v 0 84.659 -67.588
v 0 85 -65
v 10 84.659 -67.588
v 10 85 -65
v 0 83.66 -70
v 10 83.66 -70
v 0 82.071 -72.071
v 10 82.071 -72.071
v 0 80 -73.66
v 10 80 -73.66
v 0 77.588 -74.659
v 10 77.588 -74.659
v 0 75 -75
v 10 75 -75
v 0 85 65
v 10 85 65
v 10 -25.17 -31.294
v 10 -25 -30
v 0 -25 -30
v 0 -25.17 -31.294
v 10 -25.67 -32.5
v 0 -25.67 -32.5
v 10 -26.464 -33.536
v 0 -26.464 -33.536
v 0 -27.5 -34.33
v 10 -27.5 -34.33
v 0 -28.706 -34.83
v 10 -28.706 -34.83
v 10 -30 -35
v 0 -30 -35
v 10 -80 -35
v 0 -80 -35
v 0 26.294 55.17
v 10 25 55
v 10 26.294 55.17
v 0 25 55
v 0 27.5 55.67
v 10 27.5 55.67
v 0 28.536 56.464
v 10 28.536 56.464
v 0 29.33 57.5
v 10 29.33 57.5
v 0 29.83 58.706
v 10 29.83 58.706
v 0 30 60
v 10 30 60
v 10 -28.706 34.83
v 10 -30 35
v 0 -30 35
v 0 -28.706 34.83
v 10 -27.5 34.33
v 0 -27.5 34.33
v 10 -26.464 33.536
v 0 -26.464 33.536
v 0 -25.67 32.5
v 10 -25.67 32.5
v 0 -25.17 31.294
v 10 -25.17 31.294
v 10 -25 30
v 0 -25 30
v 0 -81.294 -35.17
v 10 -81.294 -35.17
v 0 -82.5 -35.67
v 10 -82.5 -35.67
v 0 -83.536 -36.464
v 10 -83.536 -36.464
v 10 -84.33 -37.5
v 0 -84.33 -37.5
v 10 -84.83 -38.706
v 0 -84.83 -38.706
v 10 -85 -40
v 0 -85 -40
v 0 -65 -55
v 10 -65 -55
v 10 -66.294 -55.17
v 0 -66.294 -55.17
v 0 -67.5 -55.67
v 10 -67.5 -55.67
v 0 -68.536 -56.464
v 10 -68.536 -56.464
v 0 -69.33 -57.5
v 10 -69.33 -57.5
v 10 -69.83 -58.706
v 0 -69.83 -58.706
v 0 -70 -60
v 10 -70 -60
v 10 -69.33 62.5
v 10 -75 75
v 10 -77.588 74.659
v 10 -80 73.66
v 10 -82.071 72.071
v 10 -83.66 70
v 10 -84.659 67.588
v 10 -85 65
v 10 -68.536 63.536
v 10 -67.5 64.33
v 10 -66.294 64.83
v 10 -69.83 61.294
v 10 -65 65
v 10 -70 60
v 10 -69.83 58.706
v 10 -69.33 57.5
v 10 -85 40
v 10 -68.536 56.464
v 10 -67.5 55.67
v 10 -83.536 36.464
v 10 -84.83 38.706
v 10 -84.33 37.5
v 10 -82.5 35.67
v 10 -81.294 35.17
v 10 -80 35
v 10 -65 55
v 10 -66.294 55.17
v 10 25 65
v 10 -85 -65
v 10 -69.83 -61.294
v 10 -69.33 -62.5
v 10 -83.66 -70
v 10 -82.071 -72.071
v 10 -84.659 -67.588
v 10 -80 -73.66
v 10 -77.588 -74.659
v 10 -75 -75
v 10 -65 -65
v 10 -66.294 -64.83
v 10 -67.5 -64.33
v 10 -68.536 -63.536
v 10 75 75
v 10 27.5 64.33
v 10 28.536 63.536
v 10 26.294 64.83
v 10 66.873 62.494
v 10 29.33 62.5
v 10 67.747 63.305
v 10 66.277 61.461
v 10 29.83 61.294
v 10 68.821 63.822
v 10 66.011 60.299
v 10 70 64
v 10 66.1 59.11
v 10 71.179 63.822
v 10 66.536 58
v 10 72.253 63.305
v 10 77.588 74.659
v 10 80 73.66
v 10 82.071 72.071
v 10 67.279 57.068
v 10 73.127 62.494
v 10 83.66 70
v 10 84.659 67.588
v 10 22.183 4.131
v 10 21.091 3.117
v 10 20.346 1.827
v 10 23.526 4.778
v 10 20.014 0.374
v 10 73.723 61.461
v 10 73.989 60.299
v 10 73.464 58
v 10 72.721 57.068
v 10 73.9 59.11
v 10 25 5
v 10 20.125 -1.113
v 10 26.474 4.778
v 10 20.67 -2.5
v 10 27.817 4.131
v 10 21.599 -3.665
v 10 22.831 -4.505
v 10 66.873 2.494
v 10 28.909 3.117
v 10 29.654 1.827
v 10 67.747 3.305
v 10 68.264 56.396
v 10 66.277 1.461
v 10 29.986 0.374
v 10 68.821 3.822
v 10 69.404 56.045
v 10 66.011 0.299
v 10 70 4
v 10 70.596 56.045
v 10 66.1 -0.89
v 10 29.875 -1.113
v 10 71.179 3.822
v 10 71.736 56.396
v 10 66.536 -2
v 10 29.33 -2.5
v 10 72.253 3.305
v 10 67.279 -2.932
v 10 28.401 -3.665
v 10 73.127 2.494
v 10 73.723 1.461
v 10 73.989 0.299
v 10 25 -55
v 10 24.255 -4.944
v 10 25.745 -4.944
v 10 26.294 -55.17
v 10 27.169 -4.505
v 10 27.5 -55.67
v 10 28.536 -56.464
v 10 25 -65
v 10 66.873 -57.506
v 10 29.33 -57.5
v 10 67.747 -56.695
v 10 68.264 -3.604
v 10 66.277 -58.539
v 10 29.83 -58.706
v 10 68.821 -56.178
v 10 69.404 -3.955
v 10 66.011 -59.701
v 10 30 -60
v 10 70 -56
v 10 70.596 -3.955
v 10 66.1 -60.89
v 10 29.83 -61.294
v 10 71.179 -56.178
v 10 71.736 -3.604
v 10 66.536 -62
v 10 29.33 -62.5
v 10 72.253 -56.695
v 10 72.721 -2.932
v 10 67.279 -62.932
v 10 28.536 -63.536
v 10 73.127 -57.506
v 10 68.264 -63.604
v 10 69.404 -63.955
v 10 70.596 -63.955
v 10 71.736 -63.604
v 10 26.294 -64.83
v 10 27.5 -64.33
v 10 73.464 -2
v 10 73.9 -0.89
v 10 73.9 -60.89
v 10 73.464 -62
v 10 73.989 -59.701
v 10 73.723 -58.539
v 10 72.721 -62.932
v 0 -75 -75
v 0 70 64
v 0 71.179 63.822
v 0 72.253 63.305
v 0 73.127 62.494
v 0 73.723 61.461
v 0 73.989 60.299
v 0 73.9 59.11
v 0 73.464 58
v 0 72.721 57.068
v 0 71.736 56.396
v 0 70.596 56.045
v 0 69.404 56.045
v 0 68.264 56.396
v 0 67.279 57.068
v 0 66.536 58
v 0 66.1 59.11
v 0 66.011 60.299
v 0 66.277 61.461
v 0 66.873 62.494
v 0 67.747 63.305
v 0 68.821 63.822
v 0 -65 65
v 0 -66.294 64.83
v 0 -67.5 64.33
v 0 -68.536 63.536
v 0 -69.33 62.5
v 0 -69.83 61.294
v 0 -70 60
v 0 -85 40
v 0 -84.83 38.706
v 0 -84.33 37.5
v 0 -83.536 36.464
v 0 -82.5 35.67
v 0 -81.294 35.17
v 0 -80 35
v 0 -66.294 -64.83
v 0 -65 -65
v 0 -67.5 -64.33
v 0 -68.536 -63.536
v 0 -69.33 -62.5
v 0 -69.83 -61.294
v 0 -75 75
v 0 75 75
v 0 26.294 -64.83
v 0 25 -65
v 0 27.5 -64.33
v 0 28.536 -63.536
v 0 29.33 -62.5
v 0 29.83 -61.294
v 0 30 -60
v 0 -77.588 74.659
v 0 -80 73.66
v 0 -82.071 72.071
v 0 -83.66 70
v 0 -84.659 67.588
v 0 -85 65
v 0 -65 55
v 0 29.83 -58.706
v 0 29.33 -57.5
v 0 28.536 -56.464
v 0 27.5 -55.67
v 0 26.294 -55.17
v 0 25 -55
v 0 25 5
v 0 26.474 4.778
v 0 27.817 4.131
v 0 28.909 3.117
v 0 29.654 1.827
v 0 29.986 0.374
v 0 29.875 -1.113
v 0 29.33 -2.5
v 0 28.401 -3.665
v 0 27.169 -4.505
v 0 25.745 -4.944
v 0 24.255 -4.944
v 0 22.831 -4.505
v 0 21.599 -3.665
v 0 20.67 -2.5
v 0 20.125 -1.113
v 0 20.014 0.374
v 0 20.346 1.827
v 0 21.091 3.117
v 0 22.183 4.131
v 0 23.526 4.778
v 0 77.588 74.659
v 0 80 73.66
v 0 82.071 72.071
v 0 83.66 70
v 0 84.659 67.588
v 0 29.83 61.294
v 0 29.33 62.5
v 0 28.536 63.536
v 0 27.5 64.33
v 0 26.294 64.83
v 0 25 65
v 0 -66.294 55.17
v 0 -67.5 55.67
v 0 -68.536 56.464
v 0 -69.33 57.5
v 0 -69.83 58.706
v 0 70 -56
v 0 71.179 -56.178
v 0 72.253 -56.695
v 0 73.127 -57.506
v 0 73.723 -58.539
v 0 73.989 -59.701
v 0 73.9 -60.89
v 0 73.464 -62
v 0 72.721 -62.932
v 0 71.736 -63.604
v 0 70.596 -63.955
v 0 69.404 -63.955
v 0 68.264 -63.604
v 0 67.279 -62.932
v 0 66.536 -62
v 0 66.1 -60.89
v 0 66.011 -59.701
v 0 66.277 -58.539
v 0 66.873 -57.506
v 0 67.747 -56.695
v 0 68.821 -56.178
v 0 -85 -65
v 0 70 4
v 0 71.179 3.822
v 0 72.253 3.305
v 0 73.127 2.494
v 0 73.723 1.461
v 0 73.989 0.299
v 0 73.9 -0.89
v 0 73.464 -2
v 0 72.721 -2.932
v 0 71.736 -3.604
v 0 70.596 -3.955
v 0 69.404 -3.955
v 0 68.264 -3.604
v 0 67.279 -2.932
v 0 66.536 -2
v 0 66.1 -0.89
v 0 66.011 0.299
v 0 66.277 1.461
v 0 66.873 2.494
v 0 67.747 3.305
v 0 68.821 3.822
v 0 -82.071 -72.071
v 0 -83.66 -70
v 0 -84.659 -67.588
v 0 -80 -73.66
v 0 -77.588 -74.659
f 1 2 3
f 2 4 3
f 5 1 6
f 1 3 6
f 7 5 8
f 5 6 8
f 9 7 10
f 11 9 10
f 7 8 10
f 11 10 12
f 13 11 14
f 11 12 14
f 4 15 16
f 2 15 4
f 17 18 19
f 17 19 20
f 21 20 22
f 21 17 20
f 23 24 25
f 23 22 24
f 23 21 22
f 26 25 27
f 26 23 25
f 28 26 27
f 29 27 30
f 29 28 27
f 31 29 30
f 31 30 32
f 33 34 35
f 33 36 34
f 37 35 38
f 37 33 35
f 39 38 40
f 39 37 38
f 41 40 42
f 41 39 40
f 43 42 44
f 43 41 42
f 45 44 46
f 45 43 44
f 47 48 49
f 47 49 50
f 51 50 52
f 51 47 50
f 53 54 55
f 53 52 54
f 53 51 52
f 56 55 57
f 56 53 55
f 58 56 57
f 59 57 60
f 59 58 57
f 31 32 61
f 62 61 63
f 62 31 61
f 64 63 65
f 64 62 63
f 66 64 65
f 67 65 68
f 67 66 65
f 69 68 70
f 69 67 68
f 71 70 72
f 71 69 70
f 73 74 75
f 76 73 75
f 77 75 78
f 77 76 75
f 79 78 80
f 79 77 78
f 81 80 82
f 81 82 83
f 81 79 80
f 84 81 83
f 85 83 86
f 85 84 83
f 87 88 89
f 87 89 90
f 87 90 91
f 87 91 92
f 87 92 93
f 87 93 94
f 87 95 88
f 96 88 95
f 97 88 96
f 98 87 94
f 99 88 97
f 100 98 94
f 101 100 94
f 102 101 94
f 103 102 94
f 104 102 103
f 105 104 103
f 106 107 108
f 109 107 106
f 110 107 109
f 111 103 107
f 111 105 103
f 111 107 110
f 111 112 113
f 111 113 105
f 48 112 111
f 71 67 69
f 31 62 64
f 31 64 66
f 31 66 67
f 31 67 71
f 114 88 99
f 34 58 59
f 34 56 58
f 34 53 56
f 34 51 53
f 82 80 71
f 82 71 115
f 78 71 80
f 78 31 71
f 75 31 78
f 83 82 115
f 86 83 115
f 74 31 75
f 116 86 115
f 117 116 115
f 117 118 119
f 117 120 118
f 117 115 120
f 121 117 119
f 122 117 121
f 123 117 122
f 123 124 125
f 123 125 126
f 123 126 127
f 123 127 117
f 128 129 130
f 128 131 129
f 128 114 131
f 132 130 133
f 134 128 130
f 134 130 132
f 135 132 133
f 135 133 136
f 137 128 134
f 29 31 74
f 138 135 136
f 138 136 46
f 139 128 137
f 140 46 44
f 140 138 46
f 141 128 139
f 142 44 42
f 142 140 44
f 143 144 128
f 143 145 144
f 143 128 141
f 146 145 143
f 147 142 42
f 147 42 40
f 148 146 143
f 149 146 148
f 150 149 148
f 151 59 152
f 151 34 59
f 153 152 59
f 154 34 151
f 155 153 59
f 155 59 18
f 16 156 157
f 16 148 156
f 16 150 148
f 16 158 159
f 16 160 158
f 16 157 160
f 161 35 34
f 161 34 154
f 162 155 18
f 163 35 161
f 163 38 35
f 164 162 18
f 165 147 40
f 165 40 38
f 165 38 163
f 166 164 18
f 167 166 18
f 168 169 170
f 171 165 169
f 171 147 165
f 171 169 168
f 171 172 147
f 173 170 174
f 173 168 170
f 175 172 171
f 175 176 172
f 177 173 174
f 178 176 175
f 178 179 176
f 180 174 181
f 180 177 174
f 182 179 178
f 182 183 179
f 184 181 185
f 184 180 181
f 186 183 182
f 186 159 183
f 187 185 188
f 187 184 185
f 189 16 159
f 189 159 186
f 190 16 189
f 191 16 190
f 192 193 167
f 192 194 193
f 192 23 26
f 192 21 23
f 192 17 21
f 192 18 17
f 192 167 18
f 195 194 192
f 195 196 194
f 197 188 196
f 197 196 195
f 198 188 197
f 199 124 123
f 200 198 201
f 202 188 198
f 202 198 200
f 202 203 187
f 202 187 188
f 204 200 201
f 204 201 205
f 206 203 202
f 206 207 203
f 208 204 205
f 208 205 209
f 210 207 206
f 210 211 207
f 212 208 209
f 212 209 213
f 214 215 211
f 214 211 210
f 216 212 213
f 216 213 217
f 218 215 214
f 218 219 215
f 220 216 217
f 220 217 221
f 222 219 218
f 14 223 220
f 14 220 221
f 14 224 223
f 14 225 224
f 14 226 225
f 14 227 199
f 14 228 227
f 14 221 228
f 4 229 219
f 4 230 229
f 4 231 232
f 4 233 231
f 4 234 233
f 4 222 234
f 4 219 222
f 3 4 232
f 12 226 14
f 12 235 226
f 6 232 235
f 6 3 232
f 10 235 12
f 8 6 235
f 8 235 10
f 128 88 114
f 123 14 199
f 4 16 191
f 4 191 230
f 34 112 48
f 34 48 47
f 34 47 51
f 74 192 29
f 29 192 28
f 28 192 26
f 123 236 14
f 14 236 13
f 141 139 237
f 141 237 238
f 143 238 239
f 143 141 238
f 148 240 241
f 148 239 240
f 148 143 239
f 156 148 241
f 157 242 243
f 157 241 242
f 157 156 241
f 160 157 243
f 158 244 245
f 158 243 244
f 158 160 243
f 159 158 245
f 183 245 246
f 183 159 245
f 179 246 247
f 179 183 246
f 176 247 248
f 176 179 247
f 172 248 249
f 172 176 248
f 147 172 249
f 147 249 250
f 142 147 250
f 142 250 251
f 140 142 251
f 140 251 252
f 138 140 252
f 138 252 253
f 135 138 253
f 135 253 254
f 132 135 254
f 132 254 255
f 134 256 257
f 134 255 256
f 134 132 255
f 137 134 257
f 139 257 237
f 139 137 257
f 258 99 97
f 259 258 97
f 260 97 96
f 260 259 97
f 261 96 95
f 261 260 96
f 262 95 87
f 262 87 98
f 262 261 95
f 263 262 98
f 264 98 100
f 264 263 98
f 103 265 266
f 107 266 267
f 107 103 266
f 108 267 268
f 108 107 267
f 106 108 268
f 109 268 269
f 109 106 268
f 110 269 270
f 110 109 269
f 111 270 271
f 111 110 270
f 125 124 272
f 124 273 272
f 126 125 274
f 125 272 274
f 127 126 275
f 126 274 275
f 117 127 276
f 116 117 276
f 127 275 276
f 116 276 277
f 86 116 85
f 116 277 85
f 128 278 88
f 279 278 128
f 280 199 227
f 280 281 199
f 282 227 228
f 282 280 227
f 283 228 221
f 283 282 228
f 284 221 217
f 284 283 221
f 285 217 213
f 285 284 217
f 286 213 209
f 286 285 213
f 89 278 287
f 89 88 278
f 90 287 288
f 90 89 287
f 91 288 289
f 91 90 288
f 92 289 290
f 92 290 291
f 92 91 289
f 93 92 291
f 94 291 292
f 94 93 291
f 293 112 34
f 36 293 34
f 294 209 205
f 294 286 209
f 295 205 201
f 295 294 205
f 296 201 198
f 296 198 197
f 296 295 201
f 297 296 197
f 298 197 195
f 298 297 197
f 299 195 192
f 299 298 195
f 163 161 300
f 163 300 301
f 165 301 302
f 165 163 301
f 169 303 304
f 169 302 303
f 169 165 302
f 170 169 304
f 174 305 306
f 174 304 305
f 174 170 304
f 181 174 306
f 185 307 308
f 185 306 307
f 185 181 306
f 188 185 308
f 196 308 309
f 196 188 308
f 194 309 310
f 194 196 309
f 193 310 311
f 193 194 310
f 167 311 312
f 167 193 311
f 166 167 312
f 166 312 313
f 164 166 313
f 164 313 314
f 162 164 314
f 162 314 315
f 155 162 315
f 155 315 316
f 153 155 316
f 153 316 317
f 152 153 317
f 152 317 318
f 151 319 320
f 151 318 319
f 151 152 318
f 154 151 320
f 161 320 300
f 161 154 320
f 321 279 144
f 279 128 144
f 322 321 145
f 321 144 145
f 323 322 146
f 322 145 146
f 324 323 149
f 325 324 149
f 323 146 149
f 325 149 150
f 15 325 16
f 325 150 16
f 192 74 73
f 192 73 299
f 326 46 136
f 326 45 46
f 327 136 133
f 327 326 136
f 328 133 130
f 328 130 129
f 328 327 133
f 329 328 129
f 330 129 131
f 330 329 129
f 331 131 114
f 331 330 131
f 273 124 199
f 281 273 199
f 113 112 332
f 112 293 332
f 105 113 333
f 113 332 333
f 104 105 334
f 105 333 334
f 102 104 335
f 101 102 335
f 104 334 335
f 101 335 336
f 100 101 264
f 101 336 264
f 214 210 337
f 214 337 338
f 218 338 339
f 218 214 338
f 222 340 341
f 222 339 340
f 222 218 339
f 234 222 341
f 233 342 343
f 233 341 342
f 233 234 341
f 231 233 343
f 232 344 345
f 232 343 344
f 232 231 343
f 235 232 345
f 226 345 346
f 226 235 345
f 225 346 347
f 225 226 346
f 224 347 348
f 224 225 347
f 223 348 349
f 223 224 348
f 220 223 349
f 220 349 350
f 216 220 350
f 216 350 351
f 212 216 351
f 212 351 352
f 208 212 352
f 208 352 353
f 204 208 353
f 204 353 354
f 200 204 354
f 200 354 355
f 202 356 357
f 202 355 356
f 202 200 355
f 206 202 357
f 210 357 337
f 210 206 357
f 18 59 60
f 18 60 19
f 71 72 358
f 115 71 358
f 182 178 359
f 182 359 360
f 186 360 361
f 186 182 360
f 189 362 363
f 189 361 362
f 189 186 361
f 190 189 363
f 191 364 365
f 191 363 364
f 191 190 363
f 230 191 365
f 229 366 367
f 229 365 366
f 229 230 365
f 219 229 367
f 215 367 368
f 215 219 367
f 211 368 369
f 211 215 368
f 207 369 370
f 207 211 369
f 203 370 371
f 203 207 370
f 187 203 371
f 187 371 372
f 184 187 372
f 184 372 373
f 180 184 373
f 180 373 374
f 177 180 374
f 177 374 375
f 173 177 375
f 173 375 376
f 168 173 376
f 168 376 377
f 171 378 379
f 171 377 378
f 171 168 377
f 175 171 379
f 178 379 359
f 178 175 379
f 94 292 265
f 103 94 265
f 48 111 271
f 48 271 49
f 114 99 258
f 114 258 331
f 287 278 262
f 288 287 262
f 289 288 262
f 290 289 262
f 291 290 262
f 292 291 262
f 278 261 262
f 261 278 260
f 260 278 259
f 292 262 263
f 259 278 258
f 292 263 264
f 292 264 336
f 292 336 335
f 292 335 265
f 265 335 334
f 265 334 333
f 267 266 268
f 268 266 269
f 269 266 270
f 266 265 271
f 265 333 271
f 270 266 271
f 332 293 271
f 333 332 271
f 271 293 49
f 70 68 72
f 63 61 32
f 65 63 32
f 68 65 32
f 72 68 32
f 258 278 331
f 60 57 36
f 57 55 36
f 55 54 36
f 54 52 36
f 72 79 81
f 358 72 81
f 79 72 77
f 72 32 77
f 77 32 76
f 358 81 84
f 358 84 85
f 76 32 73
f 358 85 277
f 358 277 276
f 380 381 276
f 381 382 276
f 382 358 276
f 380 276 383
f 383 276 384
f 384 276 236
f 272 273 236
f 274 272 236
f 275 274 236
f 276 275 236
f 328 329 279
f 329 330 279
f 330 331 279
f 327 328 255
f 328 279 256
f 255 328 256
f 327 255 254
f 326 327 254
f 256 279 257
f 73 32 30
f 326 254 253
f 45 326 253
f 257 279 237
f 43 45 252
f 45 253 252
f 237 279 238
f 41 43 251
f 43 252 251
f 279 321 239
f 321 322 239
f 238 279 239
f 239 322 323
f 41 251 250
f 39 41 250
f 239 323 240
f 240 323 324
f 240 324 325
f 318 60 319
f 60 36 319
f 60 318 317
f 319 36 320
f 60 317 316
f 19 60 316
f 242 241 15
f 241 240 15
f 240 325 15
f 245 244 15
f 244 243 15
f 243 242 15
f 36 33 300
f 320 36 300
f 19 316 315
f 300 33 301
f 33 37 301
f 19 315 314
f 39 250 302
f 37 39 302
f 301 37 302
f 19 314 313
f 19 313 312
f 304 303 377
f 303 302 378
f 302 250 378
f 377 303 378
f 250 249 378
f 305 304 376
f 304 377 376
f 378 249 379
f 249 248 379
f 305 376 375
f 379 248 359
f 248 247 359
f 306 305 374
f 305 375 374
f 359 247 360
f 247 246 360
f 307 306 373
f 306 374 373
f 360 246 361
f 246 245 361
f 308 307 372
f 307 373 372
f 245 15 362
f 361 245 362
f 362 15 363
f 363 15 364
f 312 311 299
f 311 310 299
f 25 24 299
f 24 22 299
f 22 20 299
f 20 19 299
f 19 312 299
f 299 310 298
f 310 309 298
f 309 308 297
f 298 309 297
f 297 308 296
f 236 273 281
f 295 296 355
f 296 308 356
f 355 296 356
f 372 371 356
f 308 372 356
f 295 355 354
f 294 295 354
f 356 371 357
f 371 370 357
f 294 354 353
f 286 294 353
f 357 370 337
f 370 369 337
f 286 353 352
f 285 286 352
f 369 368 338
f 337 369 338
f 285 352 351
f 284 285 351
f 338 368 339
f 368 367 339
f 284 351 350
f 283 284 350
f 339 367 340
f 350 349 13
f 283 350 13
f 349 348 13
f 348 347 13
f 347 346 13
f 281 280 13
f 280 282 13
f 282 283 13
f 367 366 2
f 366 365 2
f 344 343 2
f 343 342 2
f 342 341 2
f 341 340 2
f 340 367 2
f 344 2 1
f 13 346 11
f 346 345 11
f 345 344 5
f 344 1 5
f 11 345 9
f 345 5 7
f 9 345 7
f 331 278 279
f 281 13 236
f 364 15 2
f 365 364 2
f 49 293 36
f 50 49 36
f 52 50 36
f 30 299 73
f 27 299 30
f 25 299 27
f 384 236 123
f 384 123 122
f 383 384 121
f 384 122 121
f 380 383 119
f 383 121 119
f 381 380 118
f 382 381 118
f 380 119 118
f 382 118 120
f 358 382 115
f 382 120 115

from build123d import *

# Parameters (mm, degrees)
SKETCH1_W               = 150
SKETCH1_H               = 170
BOSS_EXTRUDE1_DEPTH     = 10
CUT_EXTRUDE1_DEPTH      = 114.798066767
CUT_EXTRUDE1_DEPTH_BACK = 114.798066767
SKETCH4_R               = 4
SKETCH4_R_2             = 5
SKETCH4_W               = 10
SKETCH4_H               = 100
FILLET1_R               = 5
FILLET2_R               = 10


with BuildPart() as part:
    # Sketch1 → Boss-Extrude1 (new body)
    with BuildSketch(Plane(origin=(0, 0, 0), x_dir=(0, 0, -1), z_dir=(1, 0, 0))):
        Rectangle(SKETCH1_W, SKETCH1_H)
    extrude(amount=BOSS_EXTRUDE1_DEPTH)

    # Sketch4 → Cut-Extrude1 (cut, two sides: drawn at the far end of the back side and taken through both)
    with BuildSketch(Plane.ZY.offset(-CUT_EXTRUDE1_DEPTH_BACK)):
        with Locations((-60, 70)):
            Circle(SKETCH4_R)
        with Locations((0, 70)):
            Circle(SKETCH4_R)
        with Locations((60, 70)):
            Circle(SKETCH4_R)
        with Locations((0, 25)):
            Circle(SKETCH4_R_2)
        with BuildLine():
            Line((-40, -85), (40, -85))
            ThreePointArc((40, -85), (36.464466094, -83.535533906), (35, -80))
            Line((35, -80), (35, -30))
            ThreePointArc((35, -30), (33.535533906, -26.464466094), (30, -25))
            Line((30, -25), (-30, -25))
            ThreePointArc((-30, -25), (-33.535533906, -26.464466094), (-35, -30))
            Line((-35, -30), (-35, -80))
            ThreePointArc((-35, -80), (-36.464466094, -83.535533906), (-40, -85))
        make_face()
        with Locations((60, -20)):
            Rectangle(SKETCH4_W, SKETCH4_H)
        with Locations((-60, -20)):
            Rectangle(SKETCH4_W, SKETCH4_H)
    extrude(amount=CUT_EXTRUDE1_DEPTH + CUT_EXTRUDE1_DEPTH_BACK, mode=Mode.SUBTRACT)

    # Fillet1
    fillet1_edges = [part.edges().sort_by_distance(p)[0] for p in [
        (5, 30, 55),
        (5, 30, 65),
        (5, -70, 65),
        (5, -70, 55),
        (5, 30, -65),
        (5, 30, -55),
        (5, -70, -55),
        (5, -70, -65),
    ]]
    fillet(fillet1_edges, radius=FILLET1_R - 0.0001)  # a hair under: the kernel refuses the full size

    # Fillet2
    fillet2_edges = [part.edges().sort_by_distance(p)[0] for p in [
        (5, -85, -75),
        (5, -85, 75),
        (5, 85, 75),
        (5, 85, -75),
    ]]
    fillet(fillet2_edges, radius=FILLET2_R)


solid = part.part
